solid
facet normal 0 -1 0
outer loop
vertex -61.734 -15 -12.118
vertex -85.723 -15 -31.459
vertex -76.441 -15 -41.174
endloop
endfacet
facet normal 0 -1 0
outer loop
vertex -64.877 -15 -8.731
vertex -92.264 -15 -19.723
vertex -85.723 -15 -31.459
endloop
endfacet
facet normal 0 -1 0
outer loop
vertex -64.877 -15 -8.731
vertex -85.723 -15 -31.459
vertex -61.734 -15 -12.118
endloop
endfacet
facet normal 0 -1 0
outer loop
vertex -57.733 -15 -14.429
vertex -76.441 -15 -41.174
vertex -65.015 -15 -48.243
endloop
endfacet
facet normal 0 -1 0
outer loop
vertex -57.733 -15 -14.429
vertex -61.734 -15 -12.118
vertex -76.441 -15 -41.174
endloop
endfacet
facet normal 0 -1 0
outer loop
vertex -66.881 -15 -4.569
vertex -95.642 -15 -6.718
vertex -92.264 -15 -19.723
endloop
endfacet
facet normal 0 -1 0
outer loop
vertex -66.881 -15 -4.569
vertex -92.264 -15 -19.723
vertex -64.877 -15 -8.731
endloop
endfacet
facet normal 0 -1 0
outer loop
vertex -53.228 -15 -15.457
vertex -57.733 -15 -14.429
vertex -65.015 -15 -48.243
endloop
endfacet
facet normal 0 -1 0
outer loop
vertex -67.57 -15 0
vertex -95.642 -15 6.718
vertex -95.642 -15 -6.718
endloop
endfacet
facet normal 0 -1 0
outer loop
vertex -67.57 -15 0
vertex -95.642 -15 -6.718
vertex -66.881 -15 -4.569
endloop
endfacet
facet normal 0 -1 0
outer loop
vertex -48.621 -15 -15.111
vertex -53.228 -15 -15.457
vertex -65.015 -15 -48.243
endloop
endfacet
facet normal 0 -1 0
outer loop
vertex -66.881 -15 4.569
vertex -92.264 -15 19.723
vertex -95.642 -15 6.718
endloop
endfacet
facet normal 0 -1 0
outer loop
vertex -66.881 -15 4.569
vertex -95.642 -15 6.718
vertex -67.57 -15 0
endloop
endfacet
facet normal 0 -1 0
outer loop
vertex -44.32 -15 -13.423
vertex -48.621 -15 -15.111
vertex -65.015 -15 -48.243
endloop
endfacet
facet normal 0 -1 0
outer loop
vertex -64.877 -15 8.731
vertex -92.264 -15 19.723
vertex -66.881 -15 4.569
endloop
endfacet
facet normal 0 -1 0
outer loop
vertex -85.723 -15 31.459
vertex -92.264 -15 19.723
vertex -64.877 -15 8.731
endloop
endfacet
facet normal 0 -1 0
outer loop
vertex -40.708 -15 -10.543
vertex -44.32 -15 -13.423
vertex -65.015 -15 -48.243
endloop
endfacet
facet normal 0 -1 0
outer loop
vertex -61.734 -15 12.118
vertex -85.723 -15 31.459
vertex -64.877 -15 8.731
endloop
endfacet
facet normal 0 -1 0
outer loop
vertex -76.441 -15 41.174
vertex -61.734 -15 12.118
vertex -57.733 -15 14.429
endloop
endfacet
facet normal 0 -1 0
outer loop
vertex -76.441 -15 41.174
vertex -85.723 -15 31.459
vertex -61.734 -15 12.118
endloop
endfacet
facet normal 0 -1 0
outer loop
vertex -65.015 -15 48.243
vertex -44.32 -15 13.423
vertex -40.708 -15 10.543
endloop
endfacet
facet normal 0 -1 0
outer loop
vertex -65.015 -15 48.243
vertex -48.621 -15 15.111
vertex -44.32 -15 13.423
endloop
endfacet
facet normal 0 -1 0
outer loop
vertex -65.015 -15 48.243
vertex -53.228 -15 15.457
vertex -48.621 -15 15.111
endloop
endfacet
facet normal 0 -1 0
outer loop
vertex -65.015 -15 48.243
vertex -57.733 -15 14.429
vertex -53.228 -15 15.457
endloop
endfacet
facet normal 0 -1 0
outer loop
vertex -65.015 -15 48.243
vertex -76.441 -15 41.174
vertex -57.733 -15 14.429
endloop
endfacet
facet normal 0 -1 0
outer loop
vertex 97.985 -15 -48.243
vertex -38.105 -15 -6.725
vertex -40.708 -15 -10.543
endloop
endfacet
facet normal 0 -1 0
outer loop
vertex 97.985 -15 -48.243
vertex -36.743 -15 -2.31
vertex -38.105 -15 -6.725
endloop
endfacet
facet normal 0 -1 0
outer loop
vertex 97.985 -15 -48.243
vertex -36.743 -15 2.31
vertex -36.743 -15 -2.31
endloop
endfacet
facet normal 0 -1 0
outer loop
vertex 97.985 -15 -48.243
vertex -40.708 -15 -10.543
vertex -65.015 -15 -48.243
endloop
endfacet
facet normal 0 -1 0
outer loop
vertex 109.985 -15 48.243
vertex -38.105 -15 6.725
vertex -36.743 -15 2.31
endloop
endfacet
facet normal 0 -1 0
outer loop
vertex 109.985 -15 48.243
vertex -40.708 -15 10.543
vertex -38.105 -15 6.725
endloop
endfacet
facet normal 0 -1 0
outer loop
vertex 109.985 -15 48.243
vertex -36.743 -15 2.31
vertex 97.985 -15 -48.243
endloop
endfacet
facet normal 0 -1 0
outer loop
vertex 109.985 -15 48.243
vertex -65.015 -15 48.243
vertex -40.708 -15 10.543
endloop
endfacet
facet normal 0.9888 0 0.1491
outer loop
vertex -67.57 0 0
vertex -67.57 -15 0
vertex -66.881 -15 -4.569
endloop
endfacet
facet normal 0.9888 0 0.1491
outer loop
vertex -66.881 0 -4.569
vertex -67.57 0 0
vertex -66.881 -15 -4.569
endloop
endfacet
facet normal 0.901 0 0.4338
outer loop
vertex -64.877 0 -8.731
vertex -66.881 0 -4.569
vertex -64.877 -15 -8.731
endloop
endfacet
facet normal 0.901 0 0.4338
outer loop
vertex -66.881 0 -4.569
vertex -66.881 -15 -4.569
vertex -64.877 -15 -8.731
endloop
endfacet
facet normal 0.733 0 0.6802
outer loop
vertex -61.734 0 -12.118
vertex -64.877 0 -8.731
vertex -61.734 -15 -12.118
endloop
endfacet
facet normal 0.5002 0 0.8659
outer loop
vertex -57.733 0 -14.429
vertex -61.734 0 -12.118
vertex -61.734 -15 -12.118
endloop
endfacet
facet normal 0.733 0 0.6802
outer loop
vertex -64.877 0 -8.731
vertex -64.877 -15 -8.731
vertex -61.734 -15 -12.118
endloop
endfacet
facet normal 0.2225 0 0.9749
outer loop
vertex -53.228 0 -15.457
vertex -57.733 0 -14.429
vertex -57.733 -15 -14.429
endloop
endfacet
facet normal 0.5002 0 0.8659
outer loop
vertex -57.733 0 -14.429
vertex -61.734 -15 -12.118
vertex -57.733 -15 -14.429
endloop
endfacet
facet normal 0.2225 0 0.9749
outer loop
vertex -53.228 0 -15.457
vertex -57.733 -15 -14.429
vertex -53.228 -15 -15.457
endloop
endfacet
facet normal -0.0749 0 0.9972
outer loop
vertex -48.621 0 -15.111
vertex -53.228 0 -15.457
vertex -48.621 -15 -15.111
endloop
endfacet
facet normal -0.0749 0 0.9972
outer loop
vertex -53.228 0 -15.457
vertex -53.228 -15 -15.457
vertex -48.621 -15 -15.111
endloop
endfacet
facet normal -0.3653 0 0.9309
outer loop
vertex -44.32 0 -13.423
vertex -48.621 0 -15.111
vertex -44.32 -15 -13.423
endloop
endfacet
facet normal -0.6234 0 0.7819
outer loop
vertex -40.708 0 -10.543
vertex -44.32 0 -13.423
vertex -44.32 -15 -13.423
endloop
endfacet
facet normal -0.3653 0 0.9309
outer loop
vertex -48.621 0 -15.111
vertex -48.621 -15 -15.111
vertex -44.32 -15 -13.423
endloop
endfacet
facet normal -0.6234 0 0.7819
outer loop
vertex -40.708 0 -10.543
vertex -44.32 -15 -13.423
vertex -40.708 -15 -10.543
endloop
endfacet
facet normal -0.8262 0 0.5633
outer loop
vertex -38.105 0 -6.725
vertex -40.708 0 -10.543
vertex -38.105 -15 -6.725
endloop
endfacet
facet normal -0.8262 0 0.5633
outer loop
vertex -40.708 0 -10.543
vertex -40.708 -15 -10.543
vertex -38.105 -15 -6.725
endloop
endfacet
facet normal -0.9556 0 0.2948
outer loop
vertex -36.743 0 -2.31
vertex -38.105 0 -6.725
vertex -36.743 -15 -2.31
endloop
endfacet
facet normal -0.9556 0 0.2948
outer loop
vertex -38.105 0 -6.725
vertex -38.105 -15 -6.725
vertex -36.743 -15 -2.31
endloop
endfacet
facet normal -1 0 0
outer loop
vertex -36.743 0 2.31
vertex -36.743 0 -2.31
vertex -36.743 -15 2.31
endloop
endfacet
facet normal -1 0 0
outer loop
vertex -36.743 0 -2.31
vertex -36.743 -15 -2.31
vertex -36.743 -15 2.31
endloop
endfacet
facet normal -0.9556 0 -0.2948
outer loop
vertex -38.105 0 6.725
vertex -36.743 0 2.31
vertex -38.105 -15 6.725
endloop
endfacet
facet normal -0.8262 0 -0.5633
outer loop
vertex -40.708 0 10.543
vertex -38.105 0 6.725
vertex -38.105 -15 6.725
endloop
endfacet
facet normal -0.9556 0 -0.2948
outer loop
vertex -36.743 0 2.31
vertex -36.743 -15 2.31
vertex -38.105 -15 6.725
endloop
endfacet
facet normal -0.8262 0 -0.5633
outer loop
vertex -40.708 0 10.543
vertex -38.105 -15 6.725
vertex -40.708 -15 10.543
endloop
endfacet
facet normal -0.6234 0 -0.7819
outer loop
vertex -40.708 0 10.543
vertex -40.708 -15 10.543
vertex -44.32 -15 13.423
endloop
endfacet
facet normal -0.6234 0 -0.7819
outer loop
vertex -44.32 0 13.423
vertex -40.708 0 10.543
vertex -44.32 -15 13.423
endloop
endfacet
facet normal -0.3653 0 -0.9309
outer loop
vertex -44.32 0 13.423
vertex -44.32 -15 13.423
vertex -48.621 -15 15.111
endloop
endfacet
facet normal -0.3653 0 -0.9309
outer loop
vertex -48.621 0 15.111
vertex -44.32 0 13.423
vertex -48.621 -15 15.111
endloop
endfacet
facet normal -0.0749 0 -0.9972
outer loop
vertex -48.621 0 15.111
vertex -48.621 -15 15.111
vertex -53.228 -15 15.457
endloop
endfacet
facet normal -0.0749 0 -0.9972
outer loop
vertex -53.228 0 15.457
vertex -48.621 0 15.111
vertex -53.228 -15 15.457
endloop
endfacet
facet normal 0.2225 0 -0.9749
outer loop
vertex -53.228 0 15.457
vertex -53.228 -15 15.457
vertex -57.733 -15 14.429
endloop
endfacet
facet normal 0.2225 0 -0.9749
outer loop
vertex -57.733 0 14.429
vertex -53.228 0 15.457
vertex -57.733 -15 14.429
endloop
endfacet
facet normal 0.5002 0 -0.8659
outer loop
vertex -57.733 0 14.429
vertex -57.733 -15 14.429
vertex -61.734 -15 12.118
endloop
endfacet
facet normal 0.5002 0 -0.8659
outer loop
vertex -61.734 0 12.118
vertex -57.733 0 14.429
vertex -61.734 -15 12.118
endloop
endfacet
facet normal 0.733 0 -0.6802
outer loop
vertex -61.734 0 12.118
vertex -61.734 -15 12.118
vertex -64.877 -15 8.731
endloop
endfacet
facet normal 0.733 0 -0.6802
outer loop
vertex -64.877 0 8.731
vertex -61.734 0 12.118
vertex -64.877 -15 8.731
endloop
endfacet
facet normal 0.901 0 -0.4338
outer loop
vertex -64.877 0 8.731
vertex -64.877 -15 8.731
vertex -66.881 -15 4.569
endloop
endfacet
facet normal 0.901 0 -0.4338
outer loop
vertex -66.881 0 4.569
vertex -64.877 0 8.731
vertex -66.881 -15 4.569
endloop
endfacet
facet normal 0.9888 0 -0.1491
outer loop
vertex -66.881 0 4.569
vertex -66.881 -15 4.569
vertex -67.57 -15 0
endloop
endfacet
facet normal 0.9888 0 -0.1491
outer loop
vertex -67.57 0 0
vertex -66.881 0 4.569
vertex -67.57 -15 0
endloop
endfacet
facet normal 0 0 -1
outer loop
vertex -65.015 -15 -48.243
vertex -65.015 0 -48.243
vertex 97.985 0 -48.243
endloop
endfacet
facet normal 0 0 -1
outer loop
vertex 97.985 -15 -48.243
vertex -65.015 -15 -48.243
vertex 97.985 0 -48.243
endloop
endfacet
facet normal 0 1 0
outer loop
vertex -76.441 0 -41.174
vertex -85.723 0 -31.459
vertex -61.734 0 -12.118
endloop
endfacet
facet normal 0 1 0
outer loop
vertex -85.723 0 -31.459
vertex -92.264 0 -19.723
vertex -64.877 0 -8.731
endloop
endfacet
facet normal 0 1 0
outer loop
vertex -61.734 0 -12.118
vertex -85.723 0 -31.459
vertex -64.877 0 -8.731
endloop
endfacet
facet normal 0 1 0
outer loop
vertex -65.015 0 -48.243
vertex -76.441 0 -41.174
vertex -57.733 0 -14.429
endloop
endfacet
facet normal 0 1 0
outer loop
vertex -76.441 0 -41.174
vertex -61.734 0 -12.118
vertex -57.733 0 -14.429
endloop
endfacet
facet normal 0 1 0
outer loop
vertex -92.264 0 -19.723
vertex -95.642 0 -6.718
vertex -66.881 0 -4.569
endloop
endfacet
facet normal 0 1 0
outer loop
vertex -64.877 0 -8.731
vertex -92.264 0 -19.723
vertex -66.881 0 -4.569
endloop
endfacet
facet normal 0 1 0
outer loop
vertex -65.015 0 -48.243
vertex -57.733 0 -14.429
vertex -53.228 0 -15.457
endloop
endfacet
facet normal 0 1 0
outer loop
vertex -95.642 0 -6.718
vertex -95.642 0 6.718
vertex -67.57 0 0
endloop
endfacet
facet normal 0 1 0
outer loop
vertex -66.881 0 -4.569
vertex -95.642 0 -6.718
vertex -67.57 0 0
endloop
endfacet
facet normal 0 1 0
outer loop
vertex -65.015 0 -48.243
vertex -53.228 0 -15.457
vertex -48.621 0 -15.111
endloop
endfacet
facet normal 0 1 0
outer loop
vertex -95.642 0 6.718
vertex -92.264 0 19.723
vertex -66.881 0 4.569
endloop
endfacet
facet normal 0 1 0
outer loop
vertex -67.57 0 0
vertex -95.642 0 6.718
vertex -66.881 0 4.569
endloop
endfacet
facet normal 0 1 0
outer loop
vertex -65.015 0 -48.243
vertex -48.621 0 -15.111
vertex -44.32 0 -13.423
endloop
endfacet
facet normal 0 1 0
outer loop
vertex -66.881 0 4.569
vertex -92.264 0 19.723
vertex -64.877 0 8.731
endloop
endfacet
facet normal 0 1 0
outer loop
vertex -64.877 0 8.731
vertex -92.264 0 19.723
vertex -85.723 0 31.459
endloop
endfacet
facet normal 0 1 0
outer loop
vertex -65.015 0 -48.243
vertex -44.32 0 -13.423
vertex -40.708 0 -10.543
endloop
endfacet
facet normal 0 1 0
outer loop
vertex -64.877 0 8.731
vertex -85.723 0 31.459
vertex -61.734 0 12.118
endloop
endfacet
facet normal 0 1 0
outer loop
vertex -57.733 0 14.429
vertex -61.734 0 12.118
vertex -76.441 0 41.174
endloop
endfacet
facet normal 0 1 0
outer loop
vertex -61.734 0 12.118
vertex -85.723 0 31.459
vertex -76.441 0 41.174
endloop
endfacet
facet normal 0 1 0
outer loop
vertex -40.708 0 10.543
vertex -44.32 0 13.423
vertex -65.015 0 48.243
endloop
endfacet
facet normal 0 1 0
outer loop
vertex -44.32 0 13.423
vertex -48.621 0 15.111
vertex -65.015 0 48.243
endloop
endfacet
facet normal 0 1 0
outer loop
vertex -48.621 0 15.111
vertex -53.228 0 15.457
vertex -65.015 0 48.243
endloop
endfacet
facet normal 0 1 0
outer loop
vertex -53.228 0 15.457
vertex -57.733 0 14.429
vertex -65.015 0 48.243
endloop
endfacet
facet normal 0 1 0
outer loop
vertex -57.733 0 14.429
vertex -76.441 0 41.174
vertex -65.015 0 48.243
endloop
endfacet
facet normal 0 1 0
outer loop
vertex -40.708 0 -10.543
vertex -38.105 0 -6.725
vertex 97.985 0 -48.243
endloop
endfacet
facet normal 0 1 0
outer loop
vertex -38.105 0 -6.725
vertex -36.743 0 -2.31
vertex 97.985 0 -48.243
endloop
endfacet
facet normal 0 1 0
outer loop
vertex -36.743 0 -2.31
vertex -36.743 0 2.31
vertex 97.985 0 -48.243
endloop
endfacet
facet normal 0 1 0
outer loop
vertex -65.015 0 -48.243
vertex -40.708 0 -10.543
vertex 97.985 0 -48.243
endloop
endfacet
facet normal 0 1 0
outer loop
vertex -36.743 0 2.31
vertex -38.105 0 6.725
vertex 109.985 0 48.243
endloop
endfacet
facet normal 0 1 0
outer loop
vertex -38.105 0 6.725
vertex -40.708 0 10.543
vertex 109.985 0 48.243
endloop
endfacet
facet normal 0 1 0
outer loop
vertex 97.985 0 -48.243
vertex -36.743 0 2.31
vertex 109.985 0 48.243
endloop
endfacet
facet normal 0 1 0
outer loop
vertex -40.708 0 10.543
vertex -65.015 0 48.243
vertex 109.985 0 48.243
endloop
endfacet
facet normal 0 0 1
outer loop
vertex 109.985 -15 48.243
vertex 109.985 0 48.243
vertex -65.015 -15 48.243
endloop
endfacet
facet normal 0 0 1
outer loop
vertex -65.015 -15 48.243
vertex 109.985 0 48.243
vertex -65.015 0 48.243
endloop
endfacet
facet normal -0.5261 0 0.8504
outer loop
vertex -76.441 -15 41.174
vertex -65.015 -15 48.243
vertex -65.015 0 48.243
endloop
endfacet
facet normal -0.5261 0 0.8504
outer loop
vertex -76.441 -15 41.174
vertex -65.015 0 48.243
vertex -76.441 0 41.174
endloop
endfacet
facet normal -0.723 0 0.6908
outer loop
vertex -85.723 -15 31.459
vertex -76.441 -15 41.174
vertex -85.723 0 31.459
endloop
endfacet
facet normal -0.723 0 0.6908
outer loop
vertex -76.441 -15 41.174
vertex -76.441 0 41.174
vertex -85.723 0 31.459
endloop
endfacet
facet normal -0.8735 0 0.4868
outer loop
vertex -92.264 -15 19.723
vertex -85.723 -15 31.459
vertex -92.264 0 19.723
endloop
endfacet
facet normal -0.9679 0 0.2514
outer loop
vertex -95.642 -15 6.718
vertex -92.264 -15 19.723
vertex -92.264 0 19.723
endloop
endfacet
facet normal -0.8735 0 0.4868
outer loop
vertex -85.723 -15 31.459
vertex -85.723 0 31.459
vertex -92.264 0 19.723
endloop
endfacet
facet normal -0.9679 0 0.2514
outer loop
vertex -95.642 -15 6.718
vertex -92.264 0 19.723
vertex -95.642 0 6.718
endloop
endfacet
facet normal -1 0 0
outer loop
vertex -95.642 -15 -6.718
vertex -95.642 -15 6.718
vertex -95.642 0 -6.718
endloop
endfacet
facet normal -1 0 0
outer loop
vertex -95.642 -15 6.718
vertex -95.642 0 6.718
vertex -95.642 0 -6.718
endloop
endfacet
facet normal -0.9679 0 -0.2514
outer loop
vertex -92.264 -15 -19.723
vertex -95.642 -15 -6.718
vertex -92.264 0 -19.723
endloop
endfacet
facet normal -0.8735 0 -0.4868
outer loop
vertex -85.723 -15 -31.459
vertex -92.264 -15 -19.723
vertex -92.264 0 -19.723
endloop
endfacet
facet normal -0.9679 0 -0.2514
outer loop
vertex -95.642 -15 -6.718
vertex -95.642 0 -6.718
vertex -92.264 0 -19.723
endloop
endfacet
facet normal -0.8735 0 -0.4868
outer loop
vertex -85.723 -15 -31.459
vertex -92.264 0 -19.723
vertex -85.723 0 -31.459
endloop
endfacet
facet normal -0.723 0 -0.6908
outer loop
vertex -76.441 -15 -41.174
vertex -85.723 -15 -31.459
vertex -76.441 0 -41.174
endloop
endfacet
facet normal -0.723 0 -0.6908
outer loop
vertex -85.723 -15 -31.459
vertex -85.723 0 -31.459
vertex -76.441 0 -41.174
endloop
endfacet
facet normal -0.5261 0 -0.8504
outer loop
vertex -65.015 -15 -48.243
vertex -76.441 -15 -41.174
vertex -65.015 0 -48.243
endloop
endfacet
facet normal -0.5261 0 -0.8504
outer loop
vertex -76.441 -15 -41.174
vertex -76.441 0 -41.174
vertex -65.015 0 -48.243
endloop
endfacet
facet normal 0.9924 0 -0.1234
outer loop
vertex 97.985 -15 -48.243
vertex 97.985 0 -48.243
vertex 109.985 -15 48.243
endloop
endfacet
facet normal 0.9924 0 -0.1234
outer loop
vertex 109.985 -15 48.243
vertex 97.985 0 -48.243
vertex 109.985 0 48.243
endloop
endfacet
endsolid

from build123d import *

# Parameters (mm, degrees)
F1_DEPTH = 15
F2_D     = 31


with BuildPart() as f1:
    # F0 (on Front) → F1 (new body)
    with BuildSketch(Plane.XZ):
        with BuildLine():
            ThreePointArc((-65.015006, 48.24327), (-96.069918, 0), (-65.015006, -48.24327))
            Line((-65.015006, -48.24327), (97.984994, -48.24327))
            Line((97.984994, -48.24327), (109.984994, 48.24327))
            Line((109.984994, 48.24327), (-65.015006, 48.24327))
        make_face()
    extrude(amount=F1_DEPTH)

    # F2 (through all)
    with Locations(Plane(origin=(0, 0, 0), x_dir=(1, 0, 0), z_dir=(0, 1, 0))):
        with Locations((-52.069918, 0)):
            Hole(F2_D / 2)


solid = f1.part
